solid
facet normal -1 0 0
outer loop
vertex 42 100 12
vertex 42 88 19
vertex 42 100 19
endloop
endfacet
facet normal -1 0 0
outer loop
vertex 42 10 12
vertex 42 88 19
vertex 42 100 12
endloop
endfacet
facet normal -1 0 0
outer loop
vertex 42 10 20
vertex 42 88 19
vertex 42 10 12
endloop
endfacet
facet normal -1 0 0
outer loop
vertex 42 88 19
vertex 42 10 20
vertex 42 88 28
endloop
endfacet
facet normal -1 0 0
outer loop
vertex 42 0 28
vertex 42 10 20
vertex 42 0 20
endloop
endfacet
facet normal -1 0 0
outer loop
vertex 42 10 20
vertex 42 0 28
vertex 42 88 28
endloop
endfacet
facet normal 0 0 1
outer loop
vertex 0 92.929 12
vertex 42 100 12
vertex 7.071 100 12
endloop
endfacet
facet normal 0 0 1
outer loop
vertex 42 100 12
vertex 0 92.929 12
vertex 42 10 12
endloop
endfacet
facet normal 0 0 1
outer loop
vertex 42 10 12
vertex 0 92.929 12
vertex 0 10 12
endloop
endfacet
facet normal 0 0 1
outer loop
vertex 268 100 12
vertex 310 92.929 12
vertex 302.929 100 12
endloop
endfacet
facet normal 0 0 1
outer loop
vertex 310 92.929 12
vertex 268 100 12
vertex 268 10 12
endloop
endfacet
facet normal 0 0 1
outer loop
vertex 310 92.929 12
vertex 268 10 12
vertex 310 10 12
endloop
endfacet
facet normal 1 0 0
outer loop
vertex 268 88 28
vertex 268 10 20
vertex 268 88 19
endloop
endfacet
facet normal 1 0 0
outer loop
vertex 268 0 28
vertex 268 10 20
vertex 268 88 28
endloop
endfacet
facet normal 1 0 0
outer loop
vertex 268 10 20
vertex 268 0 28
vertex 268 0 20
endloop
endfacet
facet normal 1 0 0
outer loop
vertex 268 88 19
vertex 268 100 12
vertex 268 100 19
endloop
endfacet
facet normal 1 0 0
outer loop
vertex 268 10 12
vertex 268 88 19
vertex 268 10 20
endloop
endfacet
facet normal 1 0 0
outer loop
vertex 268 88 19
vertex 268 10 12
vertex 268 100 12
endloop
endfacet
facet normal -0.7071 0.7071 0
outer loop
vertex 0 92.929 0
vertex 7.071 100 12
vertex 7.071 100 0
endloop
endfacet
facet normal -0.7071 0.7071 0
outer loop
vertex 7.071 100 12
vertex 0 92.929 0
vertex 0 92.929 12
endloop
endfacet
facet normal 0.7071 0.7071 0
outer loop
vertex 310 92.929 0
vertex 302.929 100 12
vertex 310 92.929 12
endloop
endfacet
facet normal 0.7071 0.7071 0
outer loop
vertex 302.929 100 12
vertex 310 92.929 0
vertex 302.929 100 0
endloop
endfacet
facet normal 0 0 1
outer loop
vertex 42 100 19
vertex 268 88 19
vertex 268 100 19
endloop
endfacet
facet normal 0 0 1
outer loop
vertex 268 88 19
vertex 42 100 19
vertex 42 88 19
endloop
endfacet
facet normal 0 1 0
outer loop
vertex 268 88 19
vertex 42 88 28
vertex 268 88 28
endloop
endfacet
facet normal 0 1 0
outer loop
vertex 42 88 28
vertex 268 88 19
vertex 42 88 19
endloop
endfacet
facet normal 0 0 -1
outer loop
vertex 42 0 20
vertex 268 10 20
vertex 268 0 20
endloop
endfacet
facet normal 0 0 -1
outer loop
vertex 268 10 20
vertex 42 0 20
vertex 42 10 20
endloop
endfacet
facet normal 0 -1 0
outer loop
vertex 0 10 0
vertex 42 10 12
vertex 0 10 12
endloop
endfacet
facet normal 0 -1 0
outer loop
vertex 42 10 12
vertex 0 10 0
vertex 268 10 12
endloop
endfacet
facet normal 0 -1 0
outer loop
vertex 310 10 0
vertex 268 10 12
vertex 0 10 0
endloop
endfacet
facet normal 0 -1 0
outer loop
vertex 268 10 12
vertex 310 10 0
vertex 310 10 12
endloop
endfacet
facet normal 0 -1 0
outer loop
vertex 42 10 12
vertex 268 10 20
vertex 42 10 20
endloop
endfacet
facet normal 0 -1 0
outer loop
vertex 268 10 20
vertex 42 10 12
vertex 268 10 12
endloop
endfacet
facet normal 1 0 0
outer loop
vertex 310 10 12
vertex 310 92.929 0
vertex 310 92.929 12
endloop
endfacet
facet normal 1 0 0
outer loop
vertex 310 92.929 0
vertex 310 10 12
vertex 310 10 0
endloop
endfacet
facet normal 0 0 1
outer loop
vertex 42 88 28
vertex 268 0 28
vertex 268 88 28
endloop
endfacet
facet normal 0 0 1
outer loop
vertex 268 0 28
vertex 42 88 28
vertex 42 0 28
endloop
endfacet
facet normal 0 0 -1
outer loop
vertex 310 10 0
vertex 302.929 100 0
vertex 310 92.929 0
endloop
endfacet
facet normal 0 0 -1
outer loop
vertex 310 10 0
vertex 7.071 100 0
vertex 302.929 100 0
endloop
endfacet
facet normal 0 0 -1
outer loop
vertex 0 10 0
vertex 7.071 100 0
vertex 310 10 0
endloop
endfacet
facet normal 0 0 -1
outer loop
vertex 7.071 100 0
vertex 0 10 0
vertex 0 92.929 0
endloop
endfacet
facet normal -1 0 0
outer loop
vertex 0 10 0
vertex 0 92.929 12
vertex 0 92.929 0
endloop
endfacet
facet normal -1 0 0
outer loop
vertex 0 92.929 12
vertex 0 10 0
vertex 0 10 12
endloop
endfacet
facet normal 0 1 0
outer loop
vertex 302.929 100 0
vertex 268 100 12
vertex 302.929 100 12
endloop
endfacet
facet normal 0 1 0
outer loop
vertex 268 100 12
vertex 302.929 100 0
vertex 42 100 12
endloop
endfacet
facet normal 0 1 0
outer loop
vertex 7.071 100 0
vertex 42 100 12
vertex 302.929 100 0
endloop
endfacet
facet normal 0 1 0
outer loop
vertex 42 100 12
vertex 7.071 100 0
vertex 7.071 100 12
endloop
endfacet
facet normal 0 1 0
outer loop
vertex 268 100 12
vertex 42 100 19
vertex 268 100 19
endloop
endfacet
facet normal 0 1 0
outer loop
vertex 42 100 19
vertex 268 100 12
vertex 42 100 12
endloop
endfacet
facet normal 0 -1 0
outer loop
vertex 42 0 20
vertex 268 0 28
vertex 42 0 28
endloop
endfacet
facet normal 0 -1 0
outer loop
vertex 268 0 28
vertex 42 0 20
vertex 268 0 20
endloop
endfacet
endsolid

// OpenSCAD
include <../src/wardrobe.scad>;
plank_zy_side();
//github_openscad -o wardrobe_1/plank_zy_side.stl -D wardrobe_n=1 -D cutting_edge=0 -D break_view_length=0 wardrobe_1/plank_zy_side_stl.scad
